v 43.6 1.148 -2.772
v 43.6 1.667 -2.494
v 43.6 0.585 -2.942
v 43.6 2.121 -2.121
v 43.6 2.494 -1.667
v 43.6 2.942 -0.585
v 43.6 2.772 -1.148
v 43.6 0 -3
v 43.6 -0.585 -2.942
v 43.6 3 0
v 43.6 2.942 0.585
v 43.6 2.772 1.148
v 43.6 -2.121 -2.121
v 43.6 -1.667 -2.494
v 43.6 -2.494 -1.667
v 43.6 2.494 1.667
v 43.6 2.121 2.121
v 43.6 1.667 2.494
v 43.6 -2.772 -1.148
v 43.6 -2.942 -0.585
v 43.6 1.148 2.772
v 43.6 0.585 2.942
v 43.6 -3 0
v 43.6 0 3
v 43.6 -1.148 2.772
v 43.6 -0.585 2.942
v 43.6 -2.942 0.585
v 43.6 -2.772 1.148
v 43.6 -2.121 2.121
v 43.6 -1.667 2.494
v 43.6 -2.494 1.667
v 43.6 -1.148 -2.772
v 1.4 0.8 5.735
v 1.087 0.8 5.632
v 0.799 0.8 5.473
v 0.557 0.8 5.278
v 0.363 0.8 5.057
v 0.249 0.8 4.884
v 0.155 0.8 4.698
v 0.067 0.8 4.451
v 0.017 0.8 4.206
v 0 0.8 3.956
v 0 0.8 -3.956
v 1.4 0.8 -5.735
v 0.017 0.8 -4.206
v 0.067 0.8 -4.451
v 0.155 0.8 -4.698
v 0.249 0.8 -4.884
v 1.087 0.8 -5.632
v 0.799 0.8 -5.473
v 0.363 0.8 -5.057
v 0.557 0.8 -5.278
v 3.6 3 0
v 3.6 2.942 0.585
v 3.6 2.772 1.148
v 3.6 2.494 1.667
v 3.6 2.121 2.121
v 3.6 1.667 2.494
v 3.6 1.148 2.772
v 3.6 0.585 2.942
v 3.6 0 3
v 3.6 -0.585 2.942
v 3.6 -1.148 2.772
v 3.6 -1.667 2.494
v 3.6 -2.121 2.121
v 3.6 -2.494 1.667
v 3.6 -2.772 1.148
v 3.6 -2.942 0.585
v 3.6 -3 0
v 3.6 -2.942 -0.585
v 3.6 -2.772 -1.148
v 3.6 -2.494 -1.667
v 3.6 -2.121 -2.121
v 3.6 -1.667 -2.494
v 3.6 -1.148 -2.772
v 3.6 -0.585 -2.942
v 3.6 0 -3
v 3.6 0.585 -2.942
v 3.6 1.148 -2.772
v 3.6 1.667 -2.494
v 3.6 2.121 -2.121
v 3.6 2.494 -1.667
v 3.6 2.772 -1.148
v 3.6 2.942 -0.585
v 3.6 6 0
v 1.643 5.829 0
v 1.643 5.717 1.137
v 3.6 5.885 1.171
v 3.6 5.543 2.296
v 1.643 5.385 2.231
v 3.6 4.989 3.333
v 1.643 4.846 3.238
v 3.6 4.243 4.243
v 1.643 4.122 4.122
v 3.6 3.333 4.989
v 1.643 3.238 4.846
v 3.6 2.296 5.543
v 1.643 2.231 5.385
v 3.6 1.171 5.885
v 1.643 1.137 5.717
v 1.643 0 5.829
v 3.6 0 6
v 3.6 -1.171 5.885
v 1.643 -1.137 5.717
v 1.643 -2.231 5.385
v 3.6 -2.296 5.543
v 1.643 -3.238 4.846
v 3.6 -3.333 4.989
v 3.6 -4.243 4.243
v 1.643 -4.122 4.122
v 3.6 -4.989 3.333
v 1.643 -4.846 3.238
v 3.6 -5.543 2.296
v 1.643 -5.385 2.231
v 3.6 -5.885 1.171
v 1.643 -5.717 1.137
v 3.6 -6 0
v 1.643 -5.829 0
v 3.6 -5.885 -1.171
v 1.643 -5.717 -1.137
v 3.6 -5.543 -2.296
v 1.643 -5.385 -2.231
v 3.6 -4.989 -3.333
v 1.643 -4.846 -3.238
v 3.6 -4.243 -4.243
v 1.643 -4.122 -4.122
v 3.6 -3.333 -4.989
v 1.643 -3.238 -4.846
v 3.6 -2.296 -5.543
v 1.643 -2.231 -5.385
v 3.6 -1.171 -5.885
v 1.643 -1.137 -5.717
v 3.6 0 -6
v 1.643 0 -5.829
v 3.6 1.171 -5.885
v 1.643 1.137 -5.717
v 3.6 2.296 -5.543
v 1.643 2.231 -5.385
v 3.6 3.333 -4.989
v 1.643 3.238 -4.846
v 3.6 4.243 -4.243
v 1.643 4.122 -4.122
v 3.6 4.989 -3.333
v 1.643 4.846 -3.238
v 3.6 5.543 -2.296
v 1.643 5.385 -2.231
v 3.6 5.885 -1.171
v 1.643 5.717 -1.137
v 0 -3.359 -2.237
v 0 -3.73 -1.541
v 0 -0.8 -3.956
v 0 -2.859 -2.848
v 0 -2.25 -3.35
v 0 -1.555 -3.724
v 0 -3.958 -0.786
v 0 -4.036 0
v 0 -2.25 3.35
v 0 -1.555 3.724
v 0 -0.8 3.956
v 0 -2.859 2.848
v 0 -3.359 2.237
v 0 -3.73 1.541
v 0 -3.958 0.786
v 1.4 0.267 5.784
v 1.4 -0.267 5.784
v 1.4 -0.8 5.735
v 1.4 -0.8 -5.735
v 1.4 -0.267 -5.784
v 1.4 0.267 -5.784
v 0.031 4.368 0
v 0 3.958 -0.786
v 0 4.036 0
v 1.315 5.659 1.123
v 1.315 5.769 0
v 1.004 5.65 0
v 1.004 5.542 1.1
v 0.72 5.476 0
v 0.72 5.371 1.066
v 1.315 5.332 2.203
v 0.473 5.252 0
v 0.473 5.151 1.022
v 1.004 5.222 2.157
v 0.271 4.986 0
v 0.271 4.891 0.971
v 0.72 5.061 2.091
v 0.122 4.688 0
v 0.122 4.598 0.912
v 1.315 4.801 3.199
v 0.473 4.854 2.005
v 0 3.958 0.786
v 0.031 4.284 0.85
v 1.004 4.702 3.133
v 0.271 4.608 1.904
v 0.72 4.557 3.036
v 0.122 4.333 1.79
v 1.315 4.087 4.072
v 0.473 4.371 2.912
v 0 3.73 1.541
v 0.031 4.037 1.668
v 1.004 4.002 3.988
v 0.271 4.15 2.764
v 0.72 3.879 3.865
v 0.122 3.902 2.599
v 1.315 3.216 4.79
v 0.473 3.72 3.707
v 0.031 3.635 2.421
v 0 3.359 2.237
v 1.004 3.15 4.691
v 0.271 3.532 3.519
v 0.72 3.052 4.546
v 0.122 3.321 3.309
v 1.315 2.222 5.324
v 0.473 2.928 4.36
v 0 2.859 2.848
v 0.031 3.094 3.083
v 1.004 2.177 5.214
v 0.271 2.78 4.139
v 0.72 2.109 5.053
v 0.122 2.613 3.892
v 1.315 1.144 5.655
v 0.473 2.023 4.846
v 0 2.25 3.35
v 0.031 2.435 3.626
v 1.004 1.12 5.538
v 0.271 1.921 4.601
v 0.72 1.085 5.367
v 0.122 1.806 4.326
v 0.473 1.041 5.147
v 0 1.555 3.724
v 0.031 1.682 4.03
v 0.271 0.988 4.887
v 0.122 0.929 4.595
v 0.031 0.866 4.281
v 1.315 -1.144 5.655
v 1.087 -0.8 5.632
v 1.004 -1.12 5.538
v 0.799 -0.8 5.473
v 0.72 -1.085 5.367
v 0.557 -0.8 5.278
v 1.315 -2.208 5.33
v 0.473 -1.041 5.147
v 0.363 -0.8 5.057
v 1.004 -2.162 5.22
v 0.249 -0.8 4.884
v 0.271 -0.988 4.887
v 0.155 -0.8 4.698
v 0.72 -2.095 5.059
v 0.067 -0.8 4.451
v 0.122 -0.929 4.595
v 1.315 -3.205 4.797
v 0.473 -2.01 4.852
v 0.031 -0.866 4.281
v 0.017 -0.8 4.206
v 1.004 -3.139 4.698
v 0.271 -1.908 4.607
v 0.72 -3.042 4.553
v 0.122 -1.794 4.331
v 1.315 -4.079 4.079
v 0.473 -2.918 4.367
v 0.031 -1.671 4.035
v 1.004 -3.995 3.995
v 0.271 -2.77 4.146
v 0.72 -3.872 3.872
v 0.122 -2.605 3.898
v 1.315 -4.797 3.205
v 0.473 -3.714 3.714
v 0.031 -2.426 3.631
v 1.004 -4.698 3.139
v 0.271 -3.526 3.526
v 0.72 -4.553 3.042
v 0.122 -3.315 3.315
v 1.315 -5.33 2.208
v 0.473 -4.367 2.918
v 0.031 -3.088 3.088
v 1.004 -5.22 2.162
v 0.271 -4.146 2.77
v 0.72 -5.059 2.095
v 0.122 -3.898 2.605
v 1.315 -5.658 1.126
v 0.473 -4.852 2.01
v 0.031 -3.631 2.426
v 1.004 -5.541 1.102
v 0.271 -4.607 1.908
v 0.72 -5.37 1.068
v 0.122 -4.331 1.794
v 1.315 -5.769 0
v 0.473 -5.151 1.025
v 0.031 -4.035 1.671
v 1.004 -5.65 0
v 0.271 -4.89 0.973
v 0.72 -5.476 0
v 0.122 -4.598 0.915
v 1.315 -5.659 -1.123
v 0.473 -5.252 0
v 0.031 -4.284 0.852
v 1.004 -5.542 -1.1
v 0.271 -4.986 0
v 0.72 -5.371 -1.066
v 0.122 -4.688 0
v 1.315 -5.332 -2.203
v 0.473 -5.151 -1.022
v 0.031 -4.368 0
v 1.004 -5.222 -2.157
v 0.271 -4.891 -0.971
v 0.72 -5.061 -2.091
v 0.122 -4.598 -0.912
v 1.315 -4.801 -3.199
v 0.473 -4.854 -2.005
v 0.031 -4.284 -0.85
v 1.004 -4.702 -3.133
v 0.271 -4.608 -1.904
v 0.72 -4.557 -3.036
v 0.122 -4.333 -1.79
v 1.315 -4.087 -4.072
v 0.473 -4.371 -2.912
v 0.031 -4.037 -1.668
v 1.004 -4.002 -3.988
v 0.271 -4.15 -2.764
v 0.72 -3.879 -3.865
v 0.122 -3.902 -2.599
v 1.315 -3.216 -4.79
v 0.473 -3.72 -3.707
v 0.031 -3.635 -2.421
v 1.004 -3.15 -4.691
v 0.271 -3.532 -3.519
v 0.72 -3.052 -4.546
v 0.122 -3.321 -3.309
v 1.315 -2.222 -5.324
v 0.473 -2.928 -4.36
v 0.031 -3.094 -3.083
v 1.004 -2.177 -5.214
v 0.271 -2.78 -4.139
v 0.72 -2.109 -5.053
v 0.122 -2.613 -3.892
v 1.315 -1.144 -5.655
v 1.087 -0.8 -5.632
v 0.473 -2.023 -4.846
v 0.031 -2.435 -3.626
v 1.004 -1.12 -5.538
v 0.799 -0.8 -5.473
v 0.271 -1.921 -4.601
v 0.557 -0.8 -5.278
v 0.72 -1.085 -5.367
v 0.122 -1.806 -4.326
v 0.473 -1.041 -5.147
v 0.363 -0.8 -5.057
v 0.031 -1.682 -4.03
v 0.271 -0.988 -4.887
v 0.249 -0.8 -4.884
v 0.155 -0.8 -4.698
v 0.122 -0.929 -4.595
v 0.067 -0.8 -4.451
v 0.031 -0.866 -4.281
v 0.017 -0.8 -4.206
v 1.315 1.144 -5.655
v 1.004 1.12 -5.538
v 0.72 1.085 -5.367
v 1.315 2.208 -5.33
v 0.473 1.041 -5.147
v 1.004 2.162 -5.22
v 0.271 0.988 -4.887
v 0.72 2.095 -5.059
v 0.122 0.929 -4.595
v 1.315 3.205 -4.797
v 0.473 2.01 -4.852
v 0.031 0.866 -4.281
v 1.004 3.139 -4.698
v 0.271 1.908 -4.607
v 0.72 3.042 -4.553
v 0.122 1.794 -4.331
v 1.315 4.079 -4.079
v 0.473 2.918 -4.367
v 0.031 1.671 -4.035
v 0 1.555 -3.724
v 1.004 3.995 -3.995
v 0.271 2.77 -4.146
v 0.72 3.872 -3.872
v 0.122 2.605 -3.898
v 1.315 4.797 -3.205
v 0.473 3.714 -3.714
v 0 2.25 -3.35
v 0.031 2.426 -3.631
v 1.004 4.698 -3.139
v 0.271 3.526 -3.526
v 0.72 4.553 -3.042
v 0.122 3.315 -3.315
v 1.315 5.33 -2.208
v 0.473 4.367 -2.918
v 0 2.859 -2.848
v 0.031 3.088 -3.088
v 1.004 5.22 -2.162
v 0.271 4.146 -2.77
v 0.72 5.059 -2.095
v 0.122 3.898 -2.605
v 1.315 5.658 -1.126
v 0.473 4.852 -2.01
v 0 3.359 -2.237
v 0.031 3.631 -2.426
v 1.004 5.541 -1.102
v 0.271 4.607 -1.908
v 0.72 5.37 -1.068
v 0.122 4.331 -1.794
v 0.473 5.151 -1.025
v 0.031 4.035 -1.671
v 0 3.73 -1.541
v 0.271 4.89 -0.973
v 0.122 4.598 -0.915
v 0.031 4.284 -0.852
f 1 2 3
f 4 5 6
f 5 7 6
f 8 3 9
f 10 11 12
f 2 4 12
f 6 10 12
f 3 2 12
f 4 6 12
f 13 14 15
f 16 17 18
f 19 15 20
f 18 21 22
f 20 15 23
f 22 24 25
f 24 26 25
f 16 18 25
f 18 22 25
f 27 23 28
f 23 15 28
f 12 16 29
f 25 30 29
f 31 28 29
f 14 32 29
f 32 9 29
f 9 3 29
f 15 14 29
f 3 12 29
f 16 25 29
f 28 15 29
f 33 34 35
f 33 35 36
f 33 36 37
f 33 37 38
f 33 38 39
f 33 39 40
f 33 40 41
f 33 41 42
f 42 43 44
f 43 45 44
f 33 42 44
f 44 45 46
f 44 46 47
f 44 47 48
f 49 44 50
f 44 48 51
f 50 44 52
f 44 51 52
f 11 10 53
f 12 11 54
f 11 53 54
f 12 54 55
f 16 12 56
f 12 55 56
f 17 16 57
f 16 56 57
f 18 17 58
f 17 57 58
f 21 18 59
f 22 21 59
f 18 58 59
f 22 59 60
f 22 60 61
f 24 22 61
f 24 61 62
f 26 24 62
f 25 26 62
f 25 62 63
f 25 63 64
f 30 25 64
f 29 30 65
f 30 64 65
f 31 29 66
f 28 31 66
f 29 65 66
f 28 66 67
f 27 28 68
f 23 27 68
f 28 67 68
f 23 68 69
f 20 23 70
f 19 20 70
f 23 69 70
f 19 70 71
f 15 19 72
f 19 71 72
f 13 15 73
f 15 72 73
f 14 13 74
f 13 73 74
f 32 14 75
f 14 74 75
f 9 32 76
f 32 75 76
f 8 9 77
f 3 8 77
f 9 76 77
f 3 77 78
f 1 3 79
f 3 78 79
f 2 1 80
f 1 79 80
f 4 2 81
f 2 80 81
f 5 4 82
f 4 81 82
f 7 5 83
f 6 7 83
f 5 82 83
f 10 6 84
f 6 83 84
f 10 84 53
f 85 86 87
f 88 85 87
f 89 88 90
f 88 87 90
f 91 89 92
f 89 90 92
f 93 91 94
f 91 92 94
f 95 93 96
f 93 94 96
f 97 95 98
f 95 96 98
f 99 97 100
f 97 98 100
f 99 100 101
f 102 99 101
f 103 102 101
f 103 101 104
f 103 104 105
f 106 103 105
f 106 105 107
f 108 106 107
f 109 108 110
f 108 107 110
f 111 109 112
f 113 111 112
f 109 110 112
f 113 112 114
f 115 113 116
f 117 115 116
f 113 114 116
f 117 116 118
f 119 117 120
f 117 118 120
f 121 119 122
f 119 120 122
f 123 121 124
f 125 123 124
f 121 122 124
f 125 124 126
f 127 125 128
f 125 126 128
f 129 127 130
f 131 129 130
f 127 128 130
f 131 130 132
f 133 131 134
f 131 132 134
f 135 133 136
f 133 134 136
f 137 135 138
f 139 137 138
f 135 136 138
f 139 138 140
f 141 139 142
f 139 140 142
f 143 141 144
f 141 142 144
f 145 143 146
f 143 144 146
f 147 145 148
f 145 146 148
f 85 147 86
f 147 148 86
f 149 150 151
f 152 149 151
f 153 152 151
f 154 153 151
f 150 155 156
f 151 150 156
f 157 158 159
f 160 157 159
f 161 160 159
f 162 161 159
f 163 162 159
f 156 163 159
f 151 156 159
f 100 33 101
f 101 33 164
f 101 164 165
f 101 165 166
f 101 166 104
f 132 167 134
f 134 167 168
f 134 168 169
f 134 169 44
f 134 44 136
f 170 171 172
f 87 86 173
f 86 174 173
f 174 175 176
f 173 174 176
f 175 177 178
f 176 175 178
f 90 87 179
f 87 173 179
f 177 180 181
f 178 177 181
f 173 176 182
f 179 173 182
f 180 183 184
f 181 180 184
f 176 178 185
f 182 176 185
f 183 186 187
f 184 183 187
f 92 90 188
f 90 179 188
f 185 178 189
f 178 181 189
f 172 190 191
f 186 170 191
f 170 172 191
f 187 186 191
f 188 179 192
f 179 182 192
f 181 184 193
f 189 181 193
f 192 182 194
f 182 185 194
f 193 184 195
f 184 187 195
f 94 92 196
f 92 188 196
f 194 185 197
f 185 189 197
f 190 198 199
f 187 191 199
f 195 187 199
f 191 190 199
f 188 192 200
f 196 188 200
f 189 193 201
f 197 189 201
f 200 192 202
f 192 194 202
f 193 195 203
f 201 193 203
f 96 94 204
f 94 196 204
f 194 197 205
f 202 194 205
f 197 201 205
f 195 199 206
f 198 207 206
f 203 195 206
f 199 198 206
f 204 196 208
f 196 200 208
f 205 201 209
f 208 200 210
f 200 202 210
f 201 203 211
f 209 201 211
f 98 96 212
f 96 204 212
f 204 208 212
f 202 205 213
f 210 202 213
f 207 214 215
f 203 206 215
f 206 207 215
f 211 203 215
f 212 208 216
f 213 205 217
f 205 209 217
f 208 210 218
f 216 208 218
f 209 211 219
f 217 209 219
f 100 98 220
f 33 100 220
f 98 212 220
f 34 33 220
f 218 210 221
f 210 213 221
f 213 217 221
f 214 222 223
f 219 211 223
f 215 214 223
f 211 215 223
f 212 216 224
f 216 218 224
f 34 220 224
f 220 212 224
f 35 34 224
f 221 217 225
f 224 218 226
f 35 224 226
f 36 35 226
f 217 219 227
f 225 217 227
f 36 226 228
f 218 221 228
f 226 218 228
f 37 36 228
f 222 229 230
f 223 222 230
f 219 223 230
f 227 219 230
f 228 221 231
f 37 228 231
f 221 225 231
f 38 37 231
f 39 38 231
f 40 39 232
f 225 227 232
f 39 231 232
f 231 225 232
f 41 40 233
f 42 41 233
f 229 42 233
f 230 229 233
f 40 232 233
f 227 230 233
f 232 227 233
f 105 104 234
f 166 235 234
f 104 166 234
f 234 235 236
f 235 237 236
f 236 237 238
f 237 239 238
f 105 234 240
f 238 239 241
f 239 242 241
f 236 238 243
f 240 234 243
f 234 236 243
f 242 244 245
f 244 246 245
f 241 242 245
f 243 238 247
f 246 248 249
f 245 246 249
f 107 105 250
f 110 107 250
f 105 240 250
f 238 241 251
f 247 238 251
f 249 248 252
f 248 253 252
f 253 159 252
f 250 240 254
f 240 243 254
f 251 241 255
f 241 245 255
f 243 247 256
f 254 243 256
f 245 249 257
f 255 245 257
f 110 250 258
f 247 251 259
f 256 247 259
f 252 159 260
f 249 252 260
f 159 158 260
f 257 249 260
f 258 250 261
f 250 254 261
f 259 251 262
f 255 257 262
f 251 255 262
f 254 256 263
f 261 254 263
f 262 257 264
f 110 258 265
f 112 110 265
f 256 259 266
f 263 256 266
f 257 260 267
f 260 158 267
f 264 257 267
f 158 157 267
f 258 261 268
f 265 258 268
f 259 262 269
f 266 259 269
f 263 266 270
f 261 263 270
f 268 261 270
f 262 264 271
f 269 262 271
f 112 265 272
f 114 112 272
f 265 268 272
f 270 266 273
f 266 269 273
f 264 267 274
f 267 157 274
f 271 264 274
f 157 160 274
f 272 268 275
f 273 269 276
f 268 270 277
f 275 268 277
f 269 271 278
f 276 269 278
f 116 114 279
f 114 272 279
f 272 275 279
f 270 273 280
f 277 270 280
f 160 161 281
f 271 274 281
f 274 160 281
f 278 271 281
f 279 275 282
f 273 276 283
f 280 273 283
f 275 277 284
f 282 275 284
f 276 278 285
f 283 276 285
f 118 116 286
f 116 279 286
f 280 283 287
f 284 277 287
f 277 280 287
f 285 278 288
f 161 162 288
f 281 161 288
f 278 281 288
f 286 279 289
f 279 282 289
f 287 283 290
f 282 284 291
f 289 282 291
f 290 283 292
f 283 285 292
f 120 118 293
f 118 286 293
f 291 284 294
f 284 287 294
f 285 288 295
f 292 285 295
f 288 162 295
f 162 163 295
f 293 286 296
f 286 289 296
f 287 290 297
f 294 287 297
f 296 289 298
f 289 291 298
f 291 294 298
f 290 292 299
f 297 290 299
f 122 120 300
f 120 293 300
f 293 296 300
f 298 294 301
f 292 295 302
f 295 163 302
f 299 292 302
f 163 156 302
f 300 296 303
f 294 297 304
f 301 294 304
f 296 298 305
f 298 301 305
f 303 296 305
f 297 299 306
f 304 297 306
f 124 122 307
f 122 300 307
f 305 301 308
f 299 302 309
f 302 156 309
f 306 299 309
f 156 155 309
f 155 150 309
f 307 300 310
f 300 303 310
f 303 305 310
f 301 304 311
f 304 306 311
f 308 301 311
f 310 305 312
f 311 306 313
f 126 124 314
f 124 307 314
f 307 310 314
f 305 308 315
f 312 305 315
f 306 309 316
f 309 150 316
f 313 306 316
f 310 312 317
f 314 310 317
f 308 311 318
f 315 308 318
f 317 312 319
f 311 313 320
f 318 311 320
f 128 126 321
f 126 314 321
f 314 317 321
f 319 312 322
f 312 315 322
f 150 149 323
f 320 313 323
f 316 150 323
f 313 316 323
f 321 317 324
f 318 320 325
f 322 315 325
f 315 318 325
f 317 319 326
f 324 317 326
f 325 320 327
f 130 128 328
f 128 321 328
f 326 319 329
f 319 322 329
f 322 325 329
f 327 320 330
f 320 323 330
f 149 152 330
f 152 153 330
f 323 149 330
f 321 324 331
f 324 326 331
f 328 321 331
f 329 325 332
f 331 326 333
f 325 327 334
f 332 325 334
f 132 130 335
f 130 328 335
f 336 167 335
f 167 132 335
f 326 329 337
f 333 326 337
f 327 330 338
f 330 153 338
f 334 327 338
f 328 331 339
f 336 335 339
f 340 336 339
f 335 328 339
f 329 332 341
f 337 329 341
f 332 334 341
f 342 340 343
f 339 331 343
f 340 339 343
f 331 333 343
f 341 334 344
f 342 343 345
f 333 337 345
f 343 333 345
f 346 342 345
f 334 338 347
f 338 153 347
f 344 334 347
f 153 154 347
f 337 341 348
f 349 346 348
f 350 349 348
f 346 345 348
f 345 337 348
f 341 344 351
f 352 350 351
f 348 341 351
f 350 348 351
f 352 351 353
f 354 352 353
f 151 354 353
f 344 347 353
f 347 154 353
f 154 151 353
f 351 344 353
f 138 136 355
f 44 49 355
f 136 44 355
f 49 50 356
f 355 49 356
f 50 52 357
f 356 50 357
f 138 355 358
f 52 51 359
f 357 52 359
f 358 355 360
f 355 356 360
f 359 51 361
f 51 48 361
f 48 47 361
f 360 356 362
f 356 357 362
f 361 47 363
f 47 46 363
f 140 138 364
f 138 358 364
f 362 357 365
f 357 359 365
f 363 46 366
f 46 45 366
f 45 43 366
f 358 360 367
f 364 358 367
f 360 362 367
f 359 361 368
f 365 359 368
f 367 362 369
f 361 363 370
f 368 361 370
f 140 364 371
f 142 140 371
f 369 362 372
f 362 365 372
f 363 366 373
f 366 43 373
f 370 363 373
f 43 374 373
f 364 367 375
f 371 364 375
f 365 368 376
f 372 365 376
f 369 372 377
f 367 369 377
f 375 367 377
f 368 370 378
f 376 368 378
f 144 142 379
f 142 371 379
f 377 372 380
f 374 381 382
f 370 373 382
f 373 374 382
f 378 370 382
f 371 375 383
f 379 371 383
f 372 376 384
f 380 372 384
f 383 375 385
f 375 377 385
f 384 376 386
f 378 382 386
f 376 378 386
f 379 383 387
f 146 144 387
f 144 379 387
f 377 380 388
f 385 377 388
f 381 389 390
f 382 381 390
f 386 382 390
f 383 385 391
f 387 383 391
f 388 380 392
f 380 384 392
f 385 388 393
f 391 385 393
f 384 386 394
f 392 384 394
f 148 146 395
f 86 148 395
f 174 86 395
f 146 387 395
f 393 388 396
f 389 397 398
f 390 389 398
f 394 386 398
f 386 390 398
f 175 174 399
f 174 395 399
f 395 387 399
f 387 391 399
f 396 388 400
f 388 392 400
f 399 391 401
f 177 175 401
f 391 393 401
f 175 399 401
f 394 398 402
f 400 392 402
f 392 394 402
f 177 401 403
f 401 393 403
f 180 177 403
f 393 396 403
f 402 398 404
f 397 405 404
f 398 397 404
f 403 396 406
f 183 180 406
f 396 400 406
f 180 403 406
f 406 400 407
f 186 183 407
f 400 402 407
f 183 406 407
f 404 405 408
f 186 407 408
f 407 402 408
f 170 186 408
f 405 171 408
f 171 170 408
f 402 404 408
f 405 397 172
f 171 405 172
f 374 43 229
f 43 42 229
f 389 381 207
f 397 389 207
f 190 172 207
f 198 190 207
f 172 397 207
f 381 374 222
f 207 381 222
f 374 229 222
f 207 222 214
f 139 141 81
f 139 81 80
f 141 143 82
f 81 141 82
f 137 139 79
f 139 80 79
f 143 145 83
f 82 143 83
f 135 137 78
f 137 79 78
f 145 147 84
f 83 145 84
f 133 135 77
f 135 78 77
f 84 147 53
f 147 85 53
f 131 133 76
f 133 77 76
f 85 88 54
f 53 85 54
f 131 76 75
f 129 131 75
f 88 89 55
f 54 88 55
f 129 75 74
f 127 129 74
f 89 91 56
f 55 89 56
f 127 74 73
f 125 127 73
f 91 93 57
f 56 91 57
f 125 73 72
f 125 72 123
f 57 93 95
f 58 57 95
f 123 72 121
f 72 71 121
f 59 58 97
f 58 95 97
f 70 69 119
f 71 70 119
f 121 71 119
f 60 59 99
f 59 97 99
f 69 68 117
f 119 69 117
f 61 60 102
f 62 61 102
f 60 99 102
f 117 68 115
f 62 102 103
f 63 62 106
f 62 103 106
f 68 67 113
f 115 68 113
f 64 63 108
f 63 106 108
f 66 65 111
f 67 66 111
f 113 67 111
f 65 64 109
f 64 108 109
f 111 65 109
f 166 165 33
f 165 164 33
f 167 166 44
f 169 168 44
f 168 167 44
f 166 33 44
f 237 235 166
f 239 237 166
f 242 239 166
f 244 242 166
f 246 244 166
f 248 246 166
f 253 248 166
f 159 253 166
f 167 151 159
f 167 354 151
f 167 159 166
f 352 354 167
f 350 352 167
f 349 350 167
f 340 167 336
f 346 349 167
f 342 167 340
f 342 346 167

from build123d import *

# Parameters (mm, degrees)
FILLET2_R  = 1.8
SKETCH2_W  = 12
SKETCH2_H  = 1.6
SLOT_DEPTH = 1.4


with BuildPart() as part:
    # BodySke → Base-Revolve (revolve)
    with BuildSketch(Plane.XY):
        Polygon((3.6, 3), (3.6, 6), (0, 5.685040811), (0, 0), (43.6, 0), (43.6, 3), align=None)
    revolve(axis=Axis((-25.4, 0, 0), (1, 0, 0)))

    # Fillet2
    fillet2_edges = [part.edges().sort_by_distance(p)[0] for p in [
        (0, -5.685040811, 0),
    ]]
    fillet(fillet2_edges, radius=FILLET2_R)

    # Sketch2 → Slot (cut)
    with BuildSketch(Plane(origin=(0, 0, 0), x_dir=(0, 0, -1), z_dir=(1, 0, 0))):
        Rectangle(SKETCH2_W, SKETCH2_H)
    extrude(amount=SLOT_DEPTH, mode=Mode.SUBTRACT)


solid = part.part
